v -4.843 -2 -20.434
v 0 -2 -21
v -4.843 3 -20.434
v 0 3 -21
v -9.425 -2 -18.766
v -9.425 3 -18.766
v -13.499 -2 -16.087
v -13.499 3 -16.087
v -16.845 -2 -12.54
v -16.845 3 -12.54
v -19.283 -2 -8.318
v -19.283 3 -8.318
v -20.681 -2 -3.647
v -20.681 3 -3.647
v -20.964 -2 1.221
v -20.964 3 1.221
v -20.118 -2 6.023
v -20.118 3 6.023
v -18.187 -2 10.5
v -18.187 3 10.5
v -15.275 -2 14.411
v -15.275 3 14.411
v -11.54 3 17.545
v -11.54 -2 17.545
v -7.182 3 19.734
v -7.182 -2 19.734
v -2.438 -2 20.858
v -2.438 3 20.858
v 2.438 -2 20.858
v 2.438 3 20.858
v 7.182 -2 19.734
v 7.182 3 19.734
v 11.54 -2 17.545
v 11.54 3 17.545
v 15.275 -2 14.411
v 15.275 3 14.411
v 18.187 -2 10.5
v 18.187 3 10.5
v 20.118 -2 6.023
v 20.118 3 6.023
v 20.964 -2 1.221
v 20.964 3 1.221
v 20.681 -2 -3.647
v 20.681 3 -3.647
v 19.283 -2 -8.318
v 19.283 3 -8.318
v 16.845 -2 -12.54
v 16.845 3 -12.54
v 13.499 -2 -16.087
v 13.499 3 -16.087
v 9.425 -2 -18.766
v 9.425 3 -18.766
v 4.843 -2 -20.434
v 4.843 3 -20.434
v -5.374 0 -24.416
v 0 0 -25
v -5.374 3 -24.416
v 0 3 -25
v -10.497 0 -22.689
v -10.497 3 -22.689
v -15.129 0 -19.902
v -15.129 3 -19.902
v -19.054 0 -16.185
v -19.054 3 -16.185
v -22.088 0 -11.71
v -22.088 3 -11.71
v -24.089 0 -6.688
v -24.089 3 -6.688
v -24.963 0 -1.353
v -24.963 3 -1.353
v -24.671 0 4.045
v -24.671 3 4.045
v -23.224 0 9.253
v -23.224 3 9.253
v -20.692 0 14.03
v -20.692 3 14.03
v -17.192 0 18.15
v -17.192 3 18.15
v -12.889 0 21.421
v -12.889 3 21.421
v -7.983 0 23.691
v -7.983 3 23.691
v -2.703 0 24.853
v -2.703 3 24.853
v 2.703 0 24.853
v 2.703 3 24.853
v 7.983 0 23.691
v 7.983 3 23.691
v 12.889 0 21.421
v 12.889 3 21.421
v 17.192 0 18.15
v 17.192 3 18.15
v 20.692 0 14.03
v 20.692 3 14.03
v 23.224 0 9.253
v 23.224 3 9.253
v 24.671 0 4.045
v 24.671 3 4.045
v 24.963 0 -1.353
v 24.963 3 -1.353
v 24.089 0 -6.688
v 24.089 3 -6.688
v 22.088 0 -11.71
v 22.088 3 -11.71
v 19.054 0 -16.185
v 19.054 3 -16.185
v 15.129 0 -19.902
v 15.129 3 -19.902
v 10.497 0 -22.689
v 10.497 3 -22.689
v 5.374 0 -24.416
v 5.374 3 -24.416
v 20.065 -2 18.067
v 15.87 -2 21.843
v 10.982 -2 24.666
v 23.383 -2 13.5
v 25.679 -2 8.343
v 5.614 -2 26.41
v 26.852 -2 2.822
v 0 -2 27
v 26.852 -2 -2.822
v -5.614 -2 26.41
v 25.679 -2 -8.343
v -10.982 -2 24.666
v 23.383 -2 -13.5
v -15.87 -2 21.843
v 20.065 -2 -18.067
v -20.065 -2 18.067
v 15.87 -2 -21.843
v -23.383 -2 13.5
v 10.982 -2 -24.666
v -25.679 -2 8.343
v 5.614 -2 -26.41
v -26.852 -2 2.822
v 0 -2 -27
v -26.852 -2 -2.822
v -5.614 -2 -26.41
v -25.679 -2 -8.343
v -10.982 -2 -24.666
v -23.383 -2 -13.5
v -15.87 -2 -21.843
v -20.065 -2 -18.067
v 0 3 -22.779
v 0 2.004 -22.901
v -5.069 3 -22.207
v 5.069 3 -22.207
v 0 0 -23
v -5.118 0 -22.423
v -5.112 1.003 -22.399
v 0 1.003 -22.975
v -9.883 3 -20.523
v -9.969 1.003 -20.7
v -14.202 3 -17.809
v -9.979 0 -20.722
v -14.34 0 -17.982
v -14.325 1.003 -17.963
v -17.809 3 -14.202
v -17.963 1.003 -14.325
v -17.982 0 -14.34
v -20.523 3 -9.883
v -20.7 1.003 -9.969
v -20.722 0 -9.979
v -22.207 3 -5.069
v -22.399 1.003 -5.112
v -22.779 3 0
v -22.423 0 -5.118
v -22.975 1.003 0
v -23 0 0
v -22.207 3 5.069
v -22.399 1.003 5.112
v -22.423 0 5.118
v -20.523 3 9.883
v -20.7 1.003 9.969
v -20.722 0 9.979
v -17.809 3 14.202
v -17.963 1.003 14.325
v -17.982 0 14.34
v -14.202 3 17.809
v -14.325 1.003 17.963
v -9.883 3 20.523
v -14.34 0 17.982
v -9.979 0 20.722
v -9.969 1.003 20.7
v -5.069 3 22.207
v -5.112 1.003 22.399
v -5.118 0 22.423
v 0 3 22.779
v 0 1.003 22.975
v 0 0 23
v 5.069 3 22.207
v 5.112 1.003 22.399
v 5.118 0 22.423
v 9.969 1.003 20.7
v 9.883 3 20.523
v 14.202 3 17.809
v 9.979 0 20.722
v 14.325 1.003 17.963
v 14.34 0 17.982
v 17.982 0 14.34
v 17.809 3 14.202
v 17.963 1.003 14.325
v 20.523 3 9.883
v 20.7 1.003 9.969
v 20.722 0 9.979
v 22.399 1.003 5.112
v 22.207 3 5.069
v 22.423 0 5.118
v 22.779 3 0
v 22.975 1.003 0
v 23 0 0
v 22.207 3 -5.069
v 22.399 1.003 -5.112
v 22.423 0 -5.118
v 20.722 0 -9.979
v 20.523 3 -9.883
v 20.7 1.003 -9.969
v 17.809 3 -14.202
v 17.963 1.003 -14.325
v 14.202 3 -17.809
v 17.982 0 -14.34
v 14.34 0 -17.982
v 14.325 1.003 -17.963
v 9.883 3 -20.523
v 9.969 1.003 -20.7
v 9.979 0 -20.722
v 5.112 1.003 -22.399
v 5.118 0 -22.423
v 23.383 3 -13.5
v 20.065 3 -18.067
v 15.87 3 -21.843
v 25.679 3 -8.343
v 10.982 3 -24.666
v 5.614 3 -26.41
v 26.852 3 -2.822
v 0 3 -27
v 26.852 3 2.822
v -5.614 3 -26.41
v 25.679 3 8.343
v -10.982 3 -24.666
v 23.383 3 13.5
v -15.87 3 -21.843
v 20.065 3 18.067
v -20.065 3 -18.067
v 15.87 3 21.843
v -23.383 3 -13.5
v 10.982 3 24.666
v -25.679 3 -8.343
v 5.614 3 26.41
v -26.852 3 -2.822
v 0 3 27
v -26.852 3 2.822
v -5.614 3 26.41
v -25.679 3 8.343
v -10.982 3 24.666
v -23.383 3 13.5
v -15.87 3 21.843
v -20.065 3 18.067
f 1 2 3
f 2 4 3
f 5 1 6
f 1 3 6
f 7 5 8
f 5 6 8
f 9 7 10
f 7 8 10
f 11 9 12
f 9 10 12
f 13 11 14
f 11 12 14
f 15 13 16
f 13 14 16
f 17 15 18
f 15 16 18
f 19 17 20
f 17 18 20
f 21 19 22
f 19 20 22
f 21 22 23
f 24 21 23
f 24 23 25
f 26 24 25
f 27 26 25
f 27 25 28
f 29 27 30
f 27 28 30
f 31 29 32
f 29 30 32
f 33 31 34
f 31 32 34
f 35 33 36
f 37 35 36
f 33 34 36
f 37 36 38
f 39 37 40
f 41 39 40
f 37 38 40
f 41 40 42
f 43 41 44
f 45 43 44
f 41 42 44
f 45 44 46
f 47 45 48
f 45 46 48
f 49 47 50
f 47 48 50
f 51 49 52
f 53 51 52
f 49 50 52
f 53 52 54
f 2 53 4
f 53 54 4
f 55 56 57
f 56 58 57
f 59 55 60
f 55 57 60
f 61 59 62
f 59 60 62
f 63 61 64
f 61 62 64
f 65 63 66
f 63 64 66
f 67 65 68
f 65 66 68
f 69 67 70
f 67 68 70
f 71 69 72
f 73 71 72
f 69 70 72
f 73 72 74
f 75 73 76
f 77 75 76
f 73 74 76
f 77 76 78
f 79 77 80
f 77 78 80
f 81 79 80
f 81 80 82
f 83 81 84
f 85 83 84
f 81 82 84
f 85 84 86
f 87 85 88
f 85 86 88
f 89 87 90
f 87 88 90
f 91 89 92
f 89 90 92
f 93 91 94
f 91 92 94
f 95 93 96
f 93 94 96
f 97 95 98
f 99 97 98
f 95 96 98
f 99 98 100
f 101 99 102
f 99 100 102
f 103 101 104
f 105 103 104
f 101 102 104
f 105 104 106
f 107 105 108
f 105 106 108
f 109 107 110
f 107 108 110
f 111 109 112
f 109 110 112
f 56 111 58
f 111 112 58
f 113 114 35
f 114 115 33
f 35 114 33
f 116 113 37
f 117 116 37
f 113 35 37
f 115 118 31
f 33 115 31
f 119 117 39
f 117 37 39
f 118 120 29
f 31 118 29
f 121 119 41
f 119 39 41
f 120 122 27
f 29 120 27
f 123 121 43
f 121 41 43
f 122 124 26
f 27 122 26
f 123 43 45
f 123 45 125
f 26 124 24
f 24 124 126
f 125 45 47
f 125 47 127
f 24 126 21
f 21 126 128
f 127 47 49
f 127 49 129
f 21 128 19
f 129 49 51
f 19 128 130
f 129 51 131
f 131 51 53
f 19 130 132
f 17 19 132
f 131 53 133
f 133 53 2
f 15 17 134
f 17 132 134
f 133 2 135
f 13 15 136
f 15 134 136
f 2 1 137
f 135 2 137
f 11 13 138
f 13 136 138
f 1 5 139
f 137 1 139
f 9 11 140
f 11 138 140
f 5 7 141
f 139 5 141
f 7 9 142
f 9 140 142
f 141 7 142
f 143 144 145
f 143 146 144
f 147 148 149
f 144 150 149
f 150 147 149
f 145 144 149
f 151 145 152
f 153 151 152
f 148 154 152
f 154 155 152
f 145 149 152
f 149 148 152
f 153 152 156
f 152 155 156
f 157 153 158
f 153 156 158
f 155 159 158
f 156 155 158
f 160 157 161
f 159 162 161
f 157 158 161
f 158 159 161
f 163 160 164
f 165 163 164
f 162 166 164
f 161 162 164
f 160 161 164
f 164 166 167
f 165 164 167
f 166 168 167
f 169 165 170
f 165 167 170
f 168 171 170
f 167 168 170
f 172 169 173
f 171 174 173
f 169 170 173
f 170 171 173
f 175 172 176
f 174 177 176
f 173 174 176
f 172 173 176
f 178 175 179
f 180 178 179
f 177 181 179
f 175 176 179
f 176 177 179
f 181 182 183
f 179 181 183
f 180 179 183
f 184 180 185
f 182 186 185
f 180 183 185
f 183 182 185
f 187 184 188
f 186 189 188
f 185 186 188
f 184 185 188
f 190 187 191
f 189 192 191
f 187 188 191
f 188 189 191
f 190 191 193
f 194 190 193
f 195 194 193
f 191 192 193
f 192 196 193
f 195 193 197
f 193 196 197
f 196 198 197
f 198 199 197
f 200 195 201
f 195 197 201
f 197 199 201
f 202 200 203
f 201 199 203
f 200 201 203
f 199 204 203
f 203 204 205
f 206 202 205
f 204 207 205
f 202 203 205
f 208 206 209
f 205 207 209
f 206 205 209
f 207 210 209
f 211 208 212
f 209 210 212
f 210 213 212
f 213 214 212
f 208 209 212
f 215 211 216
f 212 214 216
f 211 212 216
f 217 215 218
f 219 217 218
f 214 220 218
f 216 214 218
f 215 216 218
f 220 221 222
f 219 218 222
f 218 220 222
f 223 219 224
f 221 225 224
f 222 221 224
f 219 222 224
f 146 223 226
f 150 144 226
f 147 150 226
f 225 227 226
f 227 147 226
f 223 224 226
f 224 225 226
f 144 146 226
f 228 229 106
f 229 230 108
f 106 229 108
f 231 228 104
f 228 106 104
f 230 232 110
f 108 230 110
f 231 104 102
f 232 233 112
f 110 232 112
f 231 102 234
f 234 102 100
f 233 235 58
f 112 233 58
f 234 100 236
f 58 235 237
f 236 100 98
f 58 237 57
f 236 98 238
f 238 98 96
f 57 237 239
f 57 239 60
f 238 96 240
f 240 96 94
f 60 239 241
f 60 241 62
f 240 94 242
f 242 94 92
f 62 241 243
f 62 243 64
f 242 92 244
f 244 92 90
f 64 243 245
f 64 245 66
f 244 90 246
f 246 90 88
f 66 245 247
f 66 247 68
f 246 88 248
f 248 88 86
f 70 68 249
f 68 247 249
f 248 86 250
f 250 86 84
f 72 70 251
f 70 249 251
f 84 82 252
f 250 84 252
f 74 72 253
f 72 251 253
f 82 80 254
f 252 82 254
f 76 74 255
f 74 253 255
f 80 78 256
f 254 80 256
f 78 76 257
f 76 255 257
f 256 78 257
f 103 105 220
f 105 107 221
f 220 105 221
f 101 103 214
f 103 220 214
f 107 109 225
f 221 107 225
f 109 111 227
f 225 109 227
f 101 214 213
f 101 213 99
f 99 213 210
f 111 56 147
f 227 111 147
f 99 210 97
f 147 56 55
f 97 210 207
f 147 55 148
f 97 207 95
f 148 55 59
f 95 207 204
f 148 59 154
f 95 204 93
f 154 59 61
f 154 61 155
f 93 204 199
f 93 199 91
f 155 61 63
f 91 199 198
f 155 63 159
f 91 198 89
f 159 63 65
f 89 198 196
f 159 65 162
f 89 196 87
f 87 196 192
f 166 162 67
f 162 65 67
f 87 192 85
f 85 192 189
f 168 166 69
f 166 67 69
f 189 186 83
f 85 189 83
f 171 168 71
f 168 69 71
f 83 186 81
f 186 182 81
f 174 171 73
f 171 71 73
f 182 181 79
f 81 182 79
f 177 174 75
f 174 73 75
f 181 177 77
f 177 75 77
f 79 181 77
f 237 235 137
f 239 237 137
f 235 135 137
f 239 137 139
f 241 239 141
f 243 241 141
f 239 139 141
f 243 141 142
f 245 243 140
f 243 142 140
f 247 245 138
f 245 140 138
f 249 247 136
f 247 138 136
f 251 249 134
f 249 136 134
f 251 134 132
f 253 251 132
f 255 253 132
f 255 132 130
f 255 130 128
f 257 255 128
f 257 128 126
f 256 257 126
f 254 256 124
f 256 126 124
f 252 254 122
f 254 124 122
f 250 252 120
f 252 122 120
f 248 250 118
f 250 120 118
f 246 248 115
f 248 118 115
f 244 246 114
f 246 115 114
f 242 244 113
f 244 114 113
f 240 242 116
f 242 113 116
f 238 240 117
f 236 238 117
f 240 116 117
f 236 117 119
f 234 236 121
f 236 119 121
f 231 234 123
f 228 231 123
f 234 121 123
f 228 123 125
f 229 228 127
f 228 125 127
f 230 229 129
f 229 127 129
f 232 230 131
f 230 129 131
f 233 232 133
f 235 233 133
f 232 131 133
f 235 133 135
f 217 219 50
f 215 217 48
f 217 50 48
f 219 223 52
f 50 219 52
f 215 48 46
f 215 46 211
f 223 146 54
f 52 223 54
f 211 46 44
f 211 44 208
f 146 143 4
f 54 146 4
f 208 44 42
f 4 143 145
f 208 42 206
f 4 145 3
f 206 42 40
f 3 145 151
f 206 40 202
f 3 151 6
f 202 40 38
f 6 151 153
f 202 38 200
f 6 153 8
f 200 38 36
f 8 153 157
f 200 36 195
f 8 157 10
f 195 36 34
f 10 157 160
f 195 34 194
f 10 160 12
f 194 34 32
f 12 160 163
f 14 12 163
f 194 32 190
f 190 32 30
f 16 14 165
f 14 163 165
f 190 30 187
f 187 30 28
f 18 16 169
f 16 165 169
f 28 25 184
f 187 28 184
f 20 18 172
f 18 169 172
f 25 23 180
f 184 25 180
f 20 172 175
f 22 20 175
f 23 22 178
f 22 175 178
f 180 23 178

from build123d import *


with BuildPart() as part:
    # Sketch1 → Revolve1 (revolve)
    with BuildSketch(Plane(origin=(0, 0, 0), x_dir=(0, 0, -1), z_dir=(1, 0, 0))):
        with BuildLine():
            Line((25, 3), (27, 3))
            Line((27, 3), (27, -2))
            Line((27, -2), (21, -2))
            Line((21, -2), (21, 3))
            Line((21, 3), (22.778508502, 3))
            ThreePointArc((22.778508502, 3), (22.944551872, 1.504082651), (23, 0))
            Line((23, 0), (25, 0))
            Line((25, 0), (25, 3))
        make_face()
    revolve(axis=Axis((0, -564.58955378, 0), (0, 1, 0)))


solid = part.part
